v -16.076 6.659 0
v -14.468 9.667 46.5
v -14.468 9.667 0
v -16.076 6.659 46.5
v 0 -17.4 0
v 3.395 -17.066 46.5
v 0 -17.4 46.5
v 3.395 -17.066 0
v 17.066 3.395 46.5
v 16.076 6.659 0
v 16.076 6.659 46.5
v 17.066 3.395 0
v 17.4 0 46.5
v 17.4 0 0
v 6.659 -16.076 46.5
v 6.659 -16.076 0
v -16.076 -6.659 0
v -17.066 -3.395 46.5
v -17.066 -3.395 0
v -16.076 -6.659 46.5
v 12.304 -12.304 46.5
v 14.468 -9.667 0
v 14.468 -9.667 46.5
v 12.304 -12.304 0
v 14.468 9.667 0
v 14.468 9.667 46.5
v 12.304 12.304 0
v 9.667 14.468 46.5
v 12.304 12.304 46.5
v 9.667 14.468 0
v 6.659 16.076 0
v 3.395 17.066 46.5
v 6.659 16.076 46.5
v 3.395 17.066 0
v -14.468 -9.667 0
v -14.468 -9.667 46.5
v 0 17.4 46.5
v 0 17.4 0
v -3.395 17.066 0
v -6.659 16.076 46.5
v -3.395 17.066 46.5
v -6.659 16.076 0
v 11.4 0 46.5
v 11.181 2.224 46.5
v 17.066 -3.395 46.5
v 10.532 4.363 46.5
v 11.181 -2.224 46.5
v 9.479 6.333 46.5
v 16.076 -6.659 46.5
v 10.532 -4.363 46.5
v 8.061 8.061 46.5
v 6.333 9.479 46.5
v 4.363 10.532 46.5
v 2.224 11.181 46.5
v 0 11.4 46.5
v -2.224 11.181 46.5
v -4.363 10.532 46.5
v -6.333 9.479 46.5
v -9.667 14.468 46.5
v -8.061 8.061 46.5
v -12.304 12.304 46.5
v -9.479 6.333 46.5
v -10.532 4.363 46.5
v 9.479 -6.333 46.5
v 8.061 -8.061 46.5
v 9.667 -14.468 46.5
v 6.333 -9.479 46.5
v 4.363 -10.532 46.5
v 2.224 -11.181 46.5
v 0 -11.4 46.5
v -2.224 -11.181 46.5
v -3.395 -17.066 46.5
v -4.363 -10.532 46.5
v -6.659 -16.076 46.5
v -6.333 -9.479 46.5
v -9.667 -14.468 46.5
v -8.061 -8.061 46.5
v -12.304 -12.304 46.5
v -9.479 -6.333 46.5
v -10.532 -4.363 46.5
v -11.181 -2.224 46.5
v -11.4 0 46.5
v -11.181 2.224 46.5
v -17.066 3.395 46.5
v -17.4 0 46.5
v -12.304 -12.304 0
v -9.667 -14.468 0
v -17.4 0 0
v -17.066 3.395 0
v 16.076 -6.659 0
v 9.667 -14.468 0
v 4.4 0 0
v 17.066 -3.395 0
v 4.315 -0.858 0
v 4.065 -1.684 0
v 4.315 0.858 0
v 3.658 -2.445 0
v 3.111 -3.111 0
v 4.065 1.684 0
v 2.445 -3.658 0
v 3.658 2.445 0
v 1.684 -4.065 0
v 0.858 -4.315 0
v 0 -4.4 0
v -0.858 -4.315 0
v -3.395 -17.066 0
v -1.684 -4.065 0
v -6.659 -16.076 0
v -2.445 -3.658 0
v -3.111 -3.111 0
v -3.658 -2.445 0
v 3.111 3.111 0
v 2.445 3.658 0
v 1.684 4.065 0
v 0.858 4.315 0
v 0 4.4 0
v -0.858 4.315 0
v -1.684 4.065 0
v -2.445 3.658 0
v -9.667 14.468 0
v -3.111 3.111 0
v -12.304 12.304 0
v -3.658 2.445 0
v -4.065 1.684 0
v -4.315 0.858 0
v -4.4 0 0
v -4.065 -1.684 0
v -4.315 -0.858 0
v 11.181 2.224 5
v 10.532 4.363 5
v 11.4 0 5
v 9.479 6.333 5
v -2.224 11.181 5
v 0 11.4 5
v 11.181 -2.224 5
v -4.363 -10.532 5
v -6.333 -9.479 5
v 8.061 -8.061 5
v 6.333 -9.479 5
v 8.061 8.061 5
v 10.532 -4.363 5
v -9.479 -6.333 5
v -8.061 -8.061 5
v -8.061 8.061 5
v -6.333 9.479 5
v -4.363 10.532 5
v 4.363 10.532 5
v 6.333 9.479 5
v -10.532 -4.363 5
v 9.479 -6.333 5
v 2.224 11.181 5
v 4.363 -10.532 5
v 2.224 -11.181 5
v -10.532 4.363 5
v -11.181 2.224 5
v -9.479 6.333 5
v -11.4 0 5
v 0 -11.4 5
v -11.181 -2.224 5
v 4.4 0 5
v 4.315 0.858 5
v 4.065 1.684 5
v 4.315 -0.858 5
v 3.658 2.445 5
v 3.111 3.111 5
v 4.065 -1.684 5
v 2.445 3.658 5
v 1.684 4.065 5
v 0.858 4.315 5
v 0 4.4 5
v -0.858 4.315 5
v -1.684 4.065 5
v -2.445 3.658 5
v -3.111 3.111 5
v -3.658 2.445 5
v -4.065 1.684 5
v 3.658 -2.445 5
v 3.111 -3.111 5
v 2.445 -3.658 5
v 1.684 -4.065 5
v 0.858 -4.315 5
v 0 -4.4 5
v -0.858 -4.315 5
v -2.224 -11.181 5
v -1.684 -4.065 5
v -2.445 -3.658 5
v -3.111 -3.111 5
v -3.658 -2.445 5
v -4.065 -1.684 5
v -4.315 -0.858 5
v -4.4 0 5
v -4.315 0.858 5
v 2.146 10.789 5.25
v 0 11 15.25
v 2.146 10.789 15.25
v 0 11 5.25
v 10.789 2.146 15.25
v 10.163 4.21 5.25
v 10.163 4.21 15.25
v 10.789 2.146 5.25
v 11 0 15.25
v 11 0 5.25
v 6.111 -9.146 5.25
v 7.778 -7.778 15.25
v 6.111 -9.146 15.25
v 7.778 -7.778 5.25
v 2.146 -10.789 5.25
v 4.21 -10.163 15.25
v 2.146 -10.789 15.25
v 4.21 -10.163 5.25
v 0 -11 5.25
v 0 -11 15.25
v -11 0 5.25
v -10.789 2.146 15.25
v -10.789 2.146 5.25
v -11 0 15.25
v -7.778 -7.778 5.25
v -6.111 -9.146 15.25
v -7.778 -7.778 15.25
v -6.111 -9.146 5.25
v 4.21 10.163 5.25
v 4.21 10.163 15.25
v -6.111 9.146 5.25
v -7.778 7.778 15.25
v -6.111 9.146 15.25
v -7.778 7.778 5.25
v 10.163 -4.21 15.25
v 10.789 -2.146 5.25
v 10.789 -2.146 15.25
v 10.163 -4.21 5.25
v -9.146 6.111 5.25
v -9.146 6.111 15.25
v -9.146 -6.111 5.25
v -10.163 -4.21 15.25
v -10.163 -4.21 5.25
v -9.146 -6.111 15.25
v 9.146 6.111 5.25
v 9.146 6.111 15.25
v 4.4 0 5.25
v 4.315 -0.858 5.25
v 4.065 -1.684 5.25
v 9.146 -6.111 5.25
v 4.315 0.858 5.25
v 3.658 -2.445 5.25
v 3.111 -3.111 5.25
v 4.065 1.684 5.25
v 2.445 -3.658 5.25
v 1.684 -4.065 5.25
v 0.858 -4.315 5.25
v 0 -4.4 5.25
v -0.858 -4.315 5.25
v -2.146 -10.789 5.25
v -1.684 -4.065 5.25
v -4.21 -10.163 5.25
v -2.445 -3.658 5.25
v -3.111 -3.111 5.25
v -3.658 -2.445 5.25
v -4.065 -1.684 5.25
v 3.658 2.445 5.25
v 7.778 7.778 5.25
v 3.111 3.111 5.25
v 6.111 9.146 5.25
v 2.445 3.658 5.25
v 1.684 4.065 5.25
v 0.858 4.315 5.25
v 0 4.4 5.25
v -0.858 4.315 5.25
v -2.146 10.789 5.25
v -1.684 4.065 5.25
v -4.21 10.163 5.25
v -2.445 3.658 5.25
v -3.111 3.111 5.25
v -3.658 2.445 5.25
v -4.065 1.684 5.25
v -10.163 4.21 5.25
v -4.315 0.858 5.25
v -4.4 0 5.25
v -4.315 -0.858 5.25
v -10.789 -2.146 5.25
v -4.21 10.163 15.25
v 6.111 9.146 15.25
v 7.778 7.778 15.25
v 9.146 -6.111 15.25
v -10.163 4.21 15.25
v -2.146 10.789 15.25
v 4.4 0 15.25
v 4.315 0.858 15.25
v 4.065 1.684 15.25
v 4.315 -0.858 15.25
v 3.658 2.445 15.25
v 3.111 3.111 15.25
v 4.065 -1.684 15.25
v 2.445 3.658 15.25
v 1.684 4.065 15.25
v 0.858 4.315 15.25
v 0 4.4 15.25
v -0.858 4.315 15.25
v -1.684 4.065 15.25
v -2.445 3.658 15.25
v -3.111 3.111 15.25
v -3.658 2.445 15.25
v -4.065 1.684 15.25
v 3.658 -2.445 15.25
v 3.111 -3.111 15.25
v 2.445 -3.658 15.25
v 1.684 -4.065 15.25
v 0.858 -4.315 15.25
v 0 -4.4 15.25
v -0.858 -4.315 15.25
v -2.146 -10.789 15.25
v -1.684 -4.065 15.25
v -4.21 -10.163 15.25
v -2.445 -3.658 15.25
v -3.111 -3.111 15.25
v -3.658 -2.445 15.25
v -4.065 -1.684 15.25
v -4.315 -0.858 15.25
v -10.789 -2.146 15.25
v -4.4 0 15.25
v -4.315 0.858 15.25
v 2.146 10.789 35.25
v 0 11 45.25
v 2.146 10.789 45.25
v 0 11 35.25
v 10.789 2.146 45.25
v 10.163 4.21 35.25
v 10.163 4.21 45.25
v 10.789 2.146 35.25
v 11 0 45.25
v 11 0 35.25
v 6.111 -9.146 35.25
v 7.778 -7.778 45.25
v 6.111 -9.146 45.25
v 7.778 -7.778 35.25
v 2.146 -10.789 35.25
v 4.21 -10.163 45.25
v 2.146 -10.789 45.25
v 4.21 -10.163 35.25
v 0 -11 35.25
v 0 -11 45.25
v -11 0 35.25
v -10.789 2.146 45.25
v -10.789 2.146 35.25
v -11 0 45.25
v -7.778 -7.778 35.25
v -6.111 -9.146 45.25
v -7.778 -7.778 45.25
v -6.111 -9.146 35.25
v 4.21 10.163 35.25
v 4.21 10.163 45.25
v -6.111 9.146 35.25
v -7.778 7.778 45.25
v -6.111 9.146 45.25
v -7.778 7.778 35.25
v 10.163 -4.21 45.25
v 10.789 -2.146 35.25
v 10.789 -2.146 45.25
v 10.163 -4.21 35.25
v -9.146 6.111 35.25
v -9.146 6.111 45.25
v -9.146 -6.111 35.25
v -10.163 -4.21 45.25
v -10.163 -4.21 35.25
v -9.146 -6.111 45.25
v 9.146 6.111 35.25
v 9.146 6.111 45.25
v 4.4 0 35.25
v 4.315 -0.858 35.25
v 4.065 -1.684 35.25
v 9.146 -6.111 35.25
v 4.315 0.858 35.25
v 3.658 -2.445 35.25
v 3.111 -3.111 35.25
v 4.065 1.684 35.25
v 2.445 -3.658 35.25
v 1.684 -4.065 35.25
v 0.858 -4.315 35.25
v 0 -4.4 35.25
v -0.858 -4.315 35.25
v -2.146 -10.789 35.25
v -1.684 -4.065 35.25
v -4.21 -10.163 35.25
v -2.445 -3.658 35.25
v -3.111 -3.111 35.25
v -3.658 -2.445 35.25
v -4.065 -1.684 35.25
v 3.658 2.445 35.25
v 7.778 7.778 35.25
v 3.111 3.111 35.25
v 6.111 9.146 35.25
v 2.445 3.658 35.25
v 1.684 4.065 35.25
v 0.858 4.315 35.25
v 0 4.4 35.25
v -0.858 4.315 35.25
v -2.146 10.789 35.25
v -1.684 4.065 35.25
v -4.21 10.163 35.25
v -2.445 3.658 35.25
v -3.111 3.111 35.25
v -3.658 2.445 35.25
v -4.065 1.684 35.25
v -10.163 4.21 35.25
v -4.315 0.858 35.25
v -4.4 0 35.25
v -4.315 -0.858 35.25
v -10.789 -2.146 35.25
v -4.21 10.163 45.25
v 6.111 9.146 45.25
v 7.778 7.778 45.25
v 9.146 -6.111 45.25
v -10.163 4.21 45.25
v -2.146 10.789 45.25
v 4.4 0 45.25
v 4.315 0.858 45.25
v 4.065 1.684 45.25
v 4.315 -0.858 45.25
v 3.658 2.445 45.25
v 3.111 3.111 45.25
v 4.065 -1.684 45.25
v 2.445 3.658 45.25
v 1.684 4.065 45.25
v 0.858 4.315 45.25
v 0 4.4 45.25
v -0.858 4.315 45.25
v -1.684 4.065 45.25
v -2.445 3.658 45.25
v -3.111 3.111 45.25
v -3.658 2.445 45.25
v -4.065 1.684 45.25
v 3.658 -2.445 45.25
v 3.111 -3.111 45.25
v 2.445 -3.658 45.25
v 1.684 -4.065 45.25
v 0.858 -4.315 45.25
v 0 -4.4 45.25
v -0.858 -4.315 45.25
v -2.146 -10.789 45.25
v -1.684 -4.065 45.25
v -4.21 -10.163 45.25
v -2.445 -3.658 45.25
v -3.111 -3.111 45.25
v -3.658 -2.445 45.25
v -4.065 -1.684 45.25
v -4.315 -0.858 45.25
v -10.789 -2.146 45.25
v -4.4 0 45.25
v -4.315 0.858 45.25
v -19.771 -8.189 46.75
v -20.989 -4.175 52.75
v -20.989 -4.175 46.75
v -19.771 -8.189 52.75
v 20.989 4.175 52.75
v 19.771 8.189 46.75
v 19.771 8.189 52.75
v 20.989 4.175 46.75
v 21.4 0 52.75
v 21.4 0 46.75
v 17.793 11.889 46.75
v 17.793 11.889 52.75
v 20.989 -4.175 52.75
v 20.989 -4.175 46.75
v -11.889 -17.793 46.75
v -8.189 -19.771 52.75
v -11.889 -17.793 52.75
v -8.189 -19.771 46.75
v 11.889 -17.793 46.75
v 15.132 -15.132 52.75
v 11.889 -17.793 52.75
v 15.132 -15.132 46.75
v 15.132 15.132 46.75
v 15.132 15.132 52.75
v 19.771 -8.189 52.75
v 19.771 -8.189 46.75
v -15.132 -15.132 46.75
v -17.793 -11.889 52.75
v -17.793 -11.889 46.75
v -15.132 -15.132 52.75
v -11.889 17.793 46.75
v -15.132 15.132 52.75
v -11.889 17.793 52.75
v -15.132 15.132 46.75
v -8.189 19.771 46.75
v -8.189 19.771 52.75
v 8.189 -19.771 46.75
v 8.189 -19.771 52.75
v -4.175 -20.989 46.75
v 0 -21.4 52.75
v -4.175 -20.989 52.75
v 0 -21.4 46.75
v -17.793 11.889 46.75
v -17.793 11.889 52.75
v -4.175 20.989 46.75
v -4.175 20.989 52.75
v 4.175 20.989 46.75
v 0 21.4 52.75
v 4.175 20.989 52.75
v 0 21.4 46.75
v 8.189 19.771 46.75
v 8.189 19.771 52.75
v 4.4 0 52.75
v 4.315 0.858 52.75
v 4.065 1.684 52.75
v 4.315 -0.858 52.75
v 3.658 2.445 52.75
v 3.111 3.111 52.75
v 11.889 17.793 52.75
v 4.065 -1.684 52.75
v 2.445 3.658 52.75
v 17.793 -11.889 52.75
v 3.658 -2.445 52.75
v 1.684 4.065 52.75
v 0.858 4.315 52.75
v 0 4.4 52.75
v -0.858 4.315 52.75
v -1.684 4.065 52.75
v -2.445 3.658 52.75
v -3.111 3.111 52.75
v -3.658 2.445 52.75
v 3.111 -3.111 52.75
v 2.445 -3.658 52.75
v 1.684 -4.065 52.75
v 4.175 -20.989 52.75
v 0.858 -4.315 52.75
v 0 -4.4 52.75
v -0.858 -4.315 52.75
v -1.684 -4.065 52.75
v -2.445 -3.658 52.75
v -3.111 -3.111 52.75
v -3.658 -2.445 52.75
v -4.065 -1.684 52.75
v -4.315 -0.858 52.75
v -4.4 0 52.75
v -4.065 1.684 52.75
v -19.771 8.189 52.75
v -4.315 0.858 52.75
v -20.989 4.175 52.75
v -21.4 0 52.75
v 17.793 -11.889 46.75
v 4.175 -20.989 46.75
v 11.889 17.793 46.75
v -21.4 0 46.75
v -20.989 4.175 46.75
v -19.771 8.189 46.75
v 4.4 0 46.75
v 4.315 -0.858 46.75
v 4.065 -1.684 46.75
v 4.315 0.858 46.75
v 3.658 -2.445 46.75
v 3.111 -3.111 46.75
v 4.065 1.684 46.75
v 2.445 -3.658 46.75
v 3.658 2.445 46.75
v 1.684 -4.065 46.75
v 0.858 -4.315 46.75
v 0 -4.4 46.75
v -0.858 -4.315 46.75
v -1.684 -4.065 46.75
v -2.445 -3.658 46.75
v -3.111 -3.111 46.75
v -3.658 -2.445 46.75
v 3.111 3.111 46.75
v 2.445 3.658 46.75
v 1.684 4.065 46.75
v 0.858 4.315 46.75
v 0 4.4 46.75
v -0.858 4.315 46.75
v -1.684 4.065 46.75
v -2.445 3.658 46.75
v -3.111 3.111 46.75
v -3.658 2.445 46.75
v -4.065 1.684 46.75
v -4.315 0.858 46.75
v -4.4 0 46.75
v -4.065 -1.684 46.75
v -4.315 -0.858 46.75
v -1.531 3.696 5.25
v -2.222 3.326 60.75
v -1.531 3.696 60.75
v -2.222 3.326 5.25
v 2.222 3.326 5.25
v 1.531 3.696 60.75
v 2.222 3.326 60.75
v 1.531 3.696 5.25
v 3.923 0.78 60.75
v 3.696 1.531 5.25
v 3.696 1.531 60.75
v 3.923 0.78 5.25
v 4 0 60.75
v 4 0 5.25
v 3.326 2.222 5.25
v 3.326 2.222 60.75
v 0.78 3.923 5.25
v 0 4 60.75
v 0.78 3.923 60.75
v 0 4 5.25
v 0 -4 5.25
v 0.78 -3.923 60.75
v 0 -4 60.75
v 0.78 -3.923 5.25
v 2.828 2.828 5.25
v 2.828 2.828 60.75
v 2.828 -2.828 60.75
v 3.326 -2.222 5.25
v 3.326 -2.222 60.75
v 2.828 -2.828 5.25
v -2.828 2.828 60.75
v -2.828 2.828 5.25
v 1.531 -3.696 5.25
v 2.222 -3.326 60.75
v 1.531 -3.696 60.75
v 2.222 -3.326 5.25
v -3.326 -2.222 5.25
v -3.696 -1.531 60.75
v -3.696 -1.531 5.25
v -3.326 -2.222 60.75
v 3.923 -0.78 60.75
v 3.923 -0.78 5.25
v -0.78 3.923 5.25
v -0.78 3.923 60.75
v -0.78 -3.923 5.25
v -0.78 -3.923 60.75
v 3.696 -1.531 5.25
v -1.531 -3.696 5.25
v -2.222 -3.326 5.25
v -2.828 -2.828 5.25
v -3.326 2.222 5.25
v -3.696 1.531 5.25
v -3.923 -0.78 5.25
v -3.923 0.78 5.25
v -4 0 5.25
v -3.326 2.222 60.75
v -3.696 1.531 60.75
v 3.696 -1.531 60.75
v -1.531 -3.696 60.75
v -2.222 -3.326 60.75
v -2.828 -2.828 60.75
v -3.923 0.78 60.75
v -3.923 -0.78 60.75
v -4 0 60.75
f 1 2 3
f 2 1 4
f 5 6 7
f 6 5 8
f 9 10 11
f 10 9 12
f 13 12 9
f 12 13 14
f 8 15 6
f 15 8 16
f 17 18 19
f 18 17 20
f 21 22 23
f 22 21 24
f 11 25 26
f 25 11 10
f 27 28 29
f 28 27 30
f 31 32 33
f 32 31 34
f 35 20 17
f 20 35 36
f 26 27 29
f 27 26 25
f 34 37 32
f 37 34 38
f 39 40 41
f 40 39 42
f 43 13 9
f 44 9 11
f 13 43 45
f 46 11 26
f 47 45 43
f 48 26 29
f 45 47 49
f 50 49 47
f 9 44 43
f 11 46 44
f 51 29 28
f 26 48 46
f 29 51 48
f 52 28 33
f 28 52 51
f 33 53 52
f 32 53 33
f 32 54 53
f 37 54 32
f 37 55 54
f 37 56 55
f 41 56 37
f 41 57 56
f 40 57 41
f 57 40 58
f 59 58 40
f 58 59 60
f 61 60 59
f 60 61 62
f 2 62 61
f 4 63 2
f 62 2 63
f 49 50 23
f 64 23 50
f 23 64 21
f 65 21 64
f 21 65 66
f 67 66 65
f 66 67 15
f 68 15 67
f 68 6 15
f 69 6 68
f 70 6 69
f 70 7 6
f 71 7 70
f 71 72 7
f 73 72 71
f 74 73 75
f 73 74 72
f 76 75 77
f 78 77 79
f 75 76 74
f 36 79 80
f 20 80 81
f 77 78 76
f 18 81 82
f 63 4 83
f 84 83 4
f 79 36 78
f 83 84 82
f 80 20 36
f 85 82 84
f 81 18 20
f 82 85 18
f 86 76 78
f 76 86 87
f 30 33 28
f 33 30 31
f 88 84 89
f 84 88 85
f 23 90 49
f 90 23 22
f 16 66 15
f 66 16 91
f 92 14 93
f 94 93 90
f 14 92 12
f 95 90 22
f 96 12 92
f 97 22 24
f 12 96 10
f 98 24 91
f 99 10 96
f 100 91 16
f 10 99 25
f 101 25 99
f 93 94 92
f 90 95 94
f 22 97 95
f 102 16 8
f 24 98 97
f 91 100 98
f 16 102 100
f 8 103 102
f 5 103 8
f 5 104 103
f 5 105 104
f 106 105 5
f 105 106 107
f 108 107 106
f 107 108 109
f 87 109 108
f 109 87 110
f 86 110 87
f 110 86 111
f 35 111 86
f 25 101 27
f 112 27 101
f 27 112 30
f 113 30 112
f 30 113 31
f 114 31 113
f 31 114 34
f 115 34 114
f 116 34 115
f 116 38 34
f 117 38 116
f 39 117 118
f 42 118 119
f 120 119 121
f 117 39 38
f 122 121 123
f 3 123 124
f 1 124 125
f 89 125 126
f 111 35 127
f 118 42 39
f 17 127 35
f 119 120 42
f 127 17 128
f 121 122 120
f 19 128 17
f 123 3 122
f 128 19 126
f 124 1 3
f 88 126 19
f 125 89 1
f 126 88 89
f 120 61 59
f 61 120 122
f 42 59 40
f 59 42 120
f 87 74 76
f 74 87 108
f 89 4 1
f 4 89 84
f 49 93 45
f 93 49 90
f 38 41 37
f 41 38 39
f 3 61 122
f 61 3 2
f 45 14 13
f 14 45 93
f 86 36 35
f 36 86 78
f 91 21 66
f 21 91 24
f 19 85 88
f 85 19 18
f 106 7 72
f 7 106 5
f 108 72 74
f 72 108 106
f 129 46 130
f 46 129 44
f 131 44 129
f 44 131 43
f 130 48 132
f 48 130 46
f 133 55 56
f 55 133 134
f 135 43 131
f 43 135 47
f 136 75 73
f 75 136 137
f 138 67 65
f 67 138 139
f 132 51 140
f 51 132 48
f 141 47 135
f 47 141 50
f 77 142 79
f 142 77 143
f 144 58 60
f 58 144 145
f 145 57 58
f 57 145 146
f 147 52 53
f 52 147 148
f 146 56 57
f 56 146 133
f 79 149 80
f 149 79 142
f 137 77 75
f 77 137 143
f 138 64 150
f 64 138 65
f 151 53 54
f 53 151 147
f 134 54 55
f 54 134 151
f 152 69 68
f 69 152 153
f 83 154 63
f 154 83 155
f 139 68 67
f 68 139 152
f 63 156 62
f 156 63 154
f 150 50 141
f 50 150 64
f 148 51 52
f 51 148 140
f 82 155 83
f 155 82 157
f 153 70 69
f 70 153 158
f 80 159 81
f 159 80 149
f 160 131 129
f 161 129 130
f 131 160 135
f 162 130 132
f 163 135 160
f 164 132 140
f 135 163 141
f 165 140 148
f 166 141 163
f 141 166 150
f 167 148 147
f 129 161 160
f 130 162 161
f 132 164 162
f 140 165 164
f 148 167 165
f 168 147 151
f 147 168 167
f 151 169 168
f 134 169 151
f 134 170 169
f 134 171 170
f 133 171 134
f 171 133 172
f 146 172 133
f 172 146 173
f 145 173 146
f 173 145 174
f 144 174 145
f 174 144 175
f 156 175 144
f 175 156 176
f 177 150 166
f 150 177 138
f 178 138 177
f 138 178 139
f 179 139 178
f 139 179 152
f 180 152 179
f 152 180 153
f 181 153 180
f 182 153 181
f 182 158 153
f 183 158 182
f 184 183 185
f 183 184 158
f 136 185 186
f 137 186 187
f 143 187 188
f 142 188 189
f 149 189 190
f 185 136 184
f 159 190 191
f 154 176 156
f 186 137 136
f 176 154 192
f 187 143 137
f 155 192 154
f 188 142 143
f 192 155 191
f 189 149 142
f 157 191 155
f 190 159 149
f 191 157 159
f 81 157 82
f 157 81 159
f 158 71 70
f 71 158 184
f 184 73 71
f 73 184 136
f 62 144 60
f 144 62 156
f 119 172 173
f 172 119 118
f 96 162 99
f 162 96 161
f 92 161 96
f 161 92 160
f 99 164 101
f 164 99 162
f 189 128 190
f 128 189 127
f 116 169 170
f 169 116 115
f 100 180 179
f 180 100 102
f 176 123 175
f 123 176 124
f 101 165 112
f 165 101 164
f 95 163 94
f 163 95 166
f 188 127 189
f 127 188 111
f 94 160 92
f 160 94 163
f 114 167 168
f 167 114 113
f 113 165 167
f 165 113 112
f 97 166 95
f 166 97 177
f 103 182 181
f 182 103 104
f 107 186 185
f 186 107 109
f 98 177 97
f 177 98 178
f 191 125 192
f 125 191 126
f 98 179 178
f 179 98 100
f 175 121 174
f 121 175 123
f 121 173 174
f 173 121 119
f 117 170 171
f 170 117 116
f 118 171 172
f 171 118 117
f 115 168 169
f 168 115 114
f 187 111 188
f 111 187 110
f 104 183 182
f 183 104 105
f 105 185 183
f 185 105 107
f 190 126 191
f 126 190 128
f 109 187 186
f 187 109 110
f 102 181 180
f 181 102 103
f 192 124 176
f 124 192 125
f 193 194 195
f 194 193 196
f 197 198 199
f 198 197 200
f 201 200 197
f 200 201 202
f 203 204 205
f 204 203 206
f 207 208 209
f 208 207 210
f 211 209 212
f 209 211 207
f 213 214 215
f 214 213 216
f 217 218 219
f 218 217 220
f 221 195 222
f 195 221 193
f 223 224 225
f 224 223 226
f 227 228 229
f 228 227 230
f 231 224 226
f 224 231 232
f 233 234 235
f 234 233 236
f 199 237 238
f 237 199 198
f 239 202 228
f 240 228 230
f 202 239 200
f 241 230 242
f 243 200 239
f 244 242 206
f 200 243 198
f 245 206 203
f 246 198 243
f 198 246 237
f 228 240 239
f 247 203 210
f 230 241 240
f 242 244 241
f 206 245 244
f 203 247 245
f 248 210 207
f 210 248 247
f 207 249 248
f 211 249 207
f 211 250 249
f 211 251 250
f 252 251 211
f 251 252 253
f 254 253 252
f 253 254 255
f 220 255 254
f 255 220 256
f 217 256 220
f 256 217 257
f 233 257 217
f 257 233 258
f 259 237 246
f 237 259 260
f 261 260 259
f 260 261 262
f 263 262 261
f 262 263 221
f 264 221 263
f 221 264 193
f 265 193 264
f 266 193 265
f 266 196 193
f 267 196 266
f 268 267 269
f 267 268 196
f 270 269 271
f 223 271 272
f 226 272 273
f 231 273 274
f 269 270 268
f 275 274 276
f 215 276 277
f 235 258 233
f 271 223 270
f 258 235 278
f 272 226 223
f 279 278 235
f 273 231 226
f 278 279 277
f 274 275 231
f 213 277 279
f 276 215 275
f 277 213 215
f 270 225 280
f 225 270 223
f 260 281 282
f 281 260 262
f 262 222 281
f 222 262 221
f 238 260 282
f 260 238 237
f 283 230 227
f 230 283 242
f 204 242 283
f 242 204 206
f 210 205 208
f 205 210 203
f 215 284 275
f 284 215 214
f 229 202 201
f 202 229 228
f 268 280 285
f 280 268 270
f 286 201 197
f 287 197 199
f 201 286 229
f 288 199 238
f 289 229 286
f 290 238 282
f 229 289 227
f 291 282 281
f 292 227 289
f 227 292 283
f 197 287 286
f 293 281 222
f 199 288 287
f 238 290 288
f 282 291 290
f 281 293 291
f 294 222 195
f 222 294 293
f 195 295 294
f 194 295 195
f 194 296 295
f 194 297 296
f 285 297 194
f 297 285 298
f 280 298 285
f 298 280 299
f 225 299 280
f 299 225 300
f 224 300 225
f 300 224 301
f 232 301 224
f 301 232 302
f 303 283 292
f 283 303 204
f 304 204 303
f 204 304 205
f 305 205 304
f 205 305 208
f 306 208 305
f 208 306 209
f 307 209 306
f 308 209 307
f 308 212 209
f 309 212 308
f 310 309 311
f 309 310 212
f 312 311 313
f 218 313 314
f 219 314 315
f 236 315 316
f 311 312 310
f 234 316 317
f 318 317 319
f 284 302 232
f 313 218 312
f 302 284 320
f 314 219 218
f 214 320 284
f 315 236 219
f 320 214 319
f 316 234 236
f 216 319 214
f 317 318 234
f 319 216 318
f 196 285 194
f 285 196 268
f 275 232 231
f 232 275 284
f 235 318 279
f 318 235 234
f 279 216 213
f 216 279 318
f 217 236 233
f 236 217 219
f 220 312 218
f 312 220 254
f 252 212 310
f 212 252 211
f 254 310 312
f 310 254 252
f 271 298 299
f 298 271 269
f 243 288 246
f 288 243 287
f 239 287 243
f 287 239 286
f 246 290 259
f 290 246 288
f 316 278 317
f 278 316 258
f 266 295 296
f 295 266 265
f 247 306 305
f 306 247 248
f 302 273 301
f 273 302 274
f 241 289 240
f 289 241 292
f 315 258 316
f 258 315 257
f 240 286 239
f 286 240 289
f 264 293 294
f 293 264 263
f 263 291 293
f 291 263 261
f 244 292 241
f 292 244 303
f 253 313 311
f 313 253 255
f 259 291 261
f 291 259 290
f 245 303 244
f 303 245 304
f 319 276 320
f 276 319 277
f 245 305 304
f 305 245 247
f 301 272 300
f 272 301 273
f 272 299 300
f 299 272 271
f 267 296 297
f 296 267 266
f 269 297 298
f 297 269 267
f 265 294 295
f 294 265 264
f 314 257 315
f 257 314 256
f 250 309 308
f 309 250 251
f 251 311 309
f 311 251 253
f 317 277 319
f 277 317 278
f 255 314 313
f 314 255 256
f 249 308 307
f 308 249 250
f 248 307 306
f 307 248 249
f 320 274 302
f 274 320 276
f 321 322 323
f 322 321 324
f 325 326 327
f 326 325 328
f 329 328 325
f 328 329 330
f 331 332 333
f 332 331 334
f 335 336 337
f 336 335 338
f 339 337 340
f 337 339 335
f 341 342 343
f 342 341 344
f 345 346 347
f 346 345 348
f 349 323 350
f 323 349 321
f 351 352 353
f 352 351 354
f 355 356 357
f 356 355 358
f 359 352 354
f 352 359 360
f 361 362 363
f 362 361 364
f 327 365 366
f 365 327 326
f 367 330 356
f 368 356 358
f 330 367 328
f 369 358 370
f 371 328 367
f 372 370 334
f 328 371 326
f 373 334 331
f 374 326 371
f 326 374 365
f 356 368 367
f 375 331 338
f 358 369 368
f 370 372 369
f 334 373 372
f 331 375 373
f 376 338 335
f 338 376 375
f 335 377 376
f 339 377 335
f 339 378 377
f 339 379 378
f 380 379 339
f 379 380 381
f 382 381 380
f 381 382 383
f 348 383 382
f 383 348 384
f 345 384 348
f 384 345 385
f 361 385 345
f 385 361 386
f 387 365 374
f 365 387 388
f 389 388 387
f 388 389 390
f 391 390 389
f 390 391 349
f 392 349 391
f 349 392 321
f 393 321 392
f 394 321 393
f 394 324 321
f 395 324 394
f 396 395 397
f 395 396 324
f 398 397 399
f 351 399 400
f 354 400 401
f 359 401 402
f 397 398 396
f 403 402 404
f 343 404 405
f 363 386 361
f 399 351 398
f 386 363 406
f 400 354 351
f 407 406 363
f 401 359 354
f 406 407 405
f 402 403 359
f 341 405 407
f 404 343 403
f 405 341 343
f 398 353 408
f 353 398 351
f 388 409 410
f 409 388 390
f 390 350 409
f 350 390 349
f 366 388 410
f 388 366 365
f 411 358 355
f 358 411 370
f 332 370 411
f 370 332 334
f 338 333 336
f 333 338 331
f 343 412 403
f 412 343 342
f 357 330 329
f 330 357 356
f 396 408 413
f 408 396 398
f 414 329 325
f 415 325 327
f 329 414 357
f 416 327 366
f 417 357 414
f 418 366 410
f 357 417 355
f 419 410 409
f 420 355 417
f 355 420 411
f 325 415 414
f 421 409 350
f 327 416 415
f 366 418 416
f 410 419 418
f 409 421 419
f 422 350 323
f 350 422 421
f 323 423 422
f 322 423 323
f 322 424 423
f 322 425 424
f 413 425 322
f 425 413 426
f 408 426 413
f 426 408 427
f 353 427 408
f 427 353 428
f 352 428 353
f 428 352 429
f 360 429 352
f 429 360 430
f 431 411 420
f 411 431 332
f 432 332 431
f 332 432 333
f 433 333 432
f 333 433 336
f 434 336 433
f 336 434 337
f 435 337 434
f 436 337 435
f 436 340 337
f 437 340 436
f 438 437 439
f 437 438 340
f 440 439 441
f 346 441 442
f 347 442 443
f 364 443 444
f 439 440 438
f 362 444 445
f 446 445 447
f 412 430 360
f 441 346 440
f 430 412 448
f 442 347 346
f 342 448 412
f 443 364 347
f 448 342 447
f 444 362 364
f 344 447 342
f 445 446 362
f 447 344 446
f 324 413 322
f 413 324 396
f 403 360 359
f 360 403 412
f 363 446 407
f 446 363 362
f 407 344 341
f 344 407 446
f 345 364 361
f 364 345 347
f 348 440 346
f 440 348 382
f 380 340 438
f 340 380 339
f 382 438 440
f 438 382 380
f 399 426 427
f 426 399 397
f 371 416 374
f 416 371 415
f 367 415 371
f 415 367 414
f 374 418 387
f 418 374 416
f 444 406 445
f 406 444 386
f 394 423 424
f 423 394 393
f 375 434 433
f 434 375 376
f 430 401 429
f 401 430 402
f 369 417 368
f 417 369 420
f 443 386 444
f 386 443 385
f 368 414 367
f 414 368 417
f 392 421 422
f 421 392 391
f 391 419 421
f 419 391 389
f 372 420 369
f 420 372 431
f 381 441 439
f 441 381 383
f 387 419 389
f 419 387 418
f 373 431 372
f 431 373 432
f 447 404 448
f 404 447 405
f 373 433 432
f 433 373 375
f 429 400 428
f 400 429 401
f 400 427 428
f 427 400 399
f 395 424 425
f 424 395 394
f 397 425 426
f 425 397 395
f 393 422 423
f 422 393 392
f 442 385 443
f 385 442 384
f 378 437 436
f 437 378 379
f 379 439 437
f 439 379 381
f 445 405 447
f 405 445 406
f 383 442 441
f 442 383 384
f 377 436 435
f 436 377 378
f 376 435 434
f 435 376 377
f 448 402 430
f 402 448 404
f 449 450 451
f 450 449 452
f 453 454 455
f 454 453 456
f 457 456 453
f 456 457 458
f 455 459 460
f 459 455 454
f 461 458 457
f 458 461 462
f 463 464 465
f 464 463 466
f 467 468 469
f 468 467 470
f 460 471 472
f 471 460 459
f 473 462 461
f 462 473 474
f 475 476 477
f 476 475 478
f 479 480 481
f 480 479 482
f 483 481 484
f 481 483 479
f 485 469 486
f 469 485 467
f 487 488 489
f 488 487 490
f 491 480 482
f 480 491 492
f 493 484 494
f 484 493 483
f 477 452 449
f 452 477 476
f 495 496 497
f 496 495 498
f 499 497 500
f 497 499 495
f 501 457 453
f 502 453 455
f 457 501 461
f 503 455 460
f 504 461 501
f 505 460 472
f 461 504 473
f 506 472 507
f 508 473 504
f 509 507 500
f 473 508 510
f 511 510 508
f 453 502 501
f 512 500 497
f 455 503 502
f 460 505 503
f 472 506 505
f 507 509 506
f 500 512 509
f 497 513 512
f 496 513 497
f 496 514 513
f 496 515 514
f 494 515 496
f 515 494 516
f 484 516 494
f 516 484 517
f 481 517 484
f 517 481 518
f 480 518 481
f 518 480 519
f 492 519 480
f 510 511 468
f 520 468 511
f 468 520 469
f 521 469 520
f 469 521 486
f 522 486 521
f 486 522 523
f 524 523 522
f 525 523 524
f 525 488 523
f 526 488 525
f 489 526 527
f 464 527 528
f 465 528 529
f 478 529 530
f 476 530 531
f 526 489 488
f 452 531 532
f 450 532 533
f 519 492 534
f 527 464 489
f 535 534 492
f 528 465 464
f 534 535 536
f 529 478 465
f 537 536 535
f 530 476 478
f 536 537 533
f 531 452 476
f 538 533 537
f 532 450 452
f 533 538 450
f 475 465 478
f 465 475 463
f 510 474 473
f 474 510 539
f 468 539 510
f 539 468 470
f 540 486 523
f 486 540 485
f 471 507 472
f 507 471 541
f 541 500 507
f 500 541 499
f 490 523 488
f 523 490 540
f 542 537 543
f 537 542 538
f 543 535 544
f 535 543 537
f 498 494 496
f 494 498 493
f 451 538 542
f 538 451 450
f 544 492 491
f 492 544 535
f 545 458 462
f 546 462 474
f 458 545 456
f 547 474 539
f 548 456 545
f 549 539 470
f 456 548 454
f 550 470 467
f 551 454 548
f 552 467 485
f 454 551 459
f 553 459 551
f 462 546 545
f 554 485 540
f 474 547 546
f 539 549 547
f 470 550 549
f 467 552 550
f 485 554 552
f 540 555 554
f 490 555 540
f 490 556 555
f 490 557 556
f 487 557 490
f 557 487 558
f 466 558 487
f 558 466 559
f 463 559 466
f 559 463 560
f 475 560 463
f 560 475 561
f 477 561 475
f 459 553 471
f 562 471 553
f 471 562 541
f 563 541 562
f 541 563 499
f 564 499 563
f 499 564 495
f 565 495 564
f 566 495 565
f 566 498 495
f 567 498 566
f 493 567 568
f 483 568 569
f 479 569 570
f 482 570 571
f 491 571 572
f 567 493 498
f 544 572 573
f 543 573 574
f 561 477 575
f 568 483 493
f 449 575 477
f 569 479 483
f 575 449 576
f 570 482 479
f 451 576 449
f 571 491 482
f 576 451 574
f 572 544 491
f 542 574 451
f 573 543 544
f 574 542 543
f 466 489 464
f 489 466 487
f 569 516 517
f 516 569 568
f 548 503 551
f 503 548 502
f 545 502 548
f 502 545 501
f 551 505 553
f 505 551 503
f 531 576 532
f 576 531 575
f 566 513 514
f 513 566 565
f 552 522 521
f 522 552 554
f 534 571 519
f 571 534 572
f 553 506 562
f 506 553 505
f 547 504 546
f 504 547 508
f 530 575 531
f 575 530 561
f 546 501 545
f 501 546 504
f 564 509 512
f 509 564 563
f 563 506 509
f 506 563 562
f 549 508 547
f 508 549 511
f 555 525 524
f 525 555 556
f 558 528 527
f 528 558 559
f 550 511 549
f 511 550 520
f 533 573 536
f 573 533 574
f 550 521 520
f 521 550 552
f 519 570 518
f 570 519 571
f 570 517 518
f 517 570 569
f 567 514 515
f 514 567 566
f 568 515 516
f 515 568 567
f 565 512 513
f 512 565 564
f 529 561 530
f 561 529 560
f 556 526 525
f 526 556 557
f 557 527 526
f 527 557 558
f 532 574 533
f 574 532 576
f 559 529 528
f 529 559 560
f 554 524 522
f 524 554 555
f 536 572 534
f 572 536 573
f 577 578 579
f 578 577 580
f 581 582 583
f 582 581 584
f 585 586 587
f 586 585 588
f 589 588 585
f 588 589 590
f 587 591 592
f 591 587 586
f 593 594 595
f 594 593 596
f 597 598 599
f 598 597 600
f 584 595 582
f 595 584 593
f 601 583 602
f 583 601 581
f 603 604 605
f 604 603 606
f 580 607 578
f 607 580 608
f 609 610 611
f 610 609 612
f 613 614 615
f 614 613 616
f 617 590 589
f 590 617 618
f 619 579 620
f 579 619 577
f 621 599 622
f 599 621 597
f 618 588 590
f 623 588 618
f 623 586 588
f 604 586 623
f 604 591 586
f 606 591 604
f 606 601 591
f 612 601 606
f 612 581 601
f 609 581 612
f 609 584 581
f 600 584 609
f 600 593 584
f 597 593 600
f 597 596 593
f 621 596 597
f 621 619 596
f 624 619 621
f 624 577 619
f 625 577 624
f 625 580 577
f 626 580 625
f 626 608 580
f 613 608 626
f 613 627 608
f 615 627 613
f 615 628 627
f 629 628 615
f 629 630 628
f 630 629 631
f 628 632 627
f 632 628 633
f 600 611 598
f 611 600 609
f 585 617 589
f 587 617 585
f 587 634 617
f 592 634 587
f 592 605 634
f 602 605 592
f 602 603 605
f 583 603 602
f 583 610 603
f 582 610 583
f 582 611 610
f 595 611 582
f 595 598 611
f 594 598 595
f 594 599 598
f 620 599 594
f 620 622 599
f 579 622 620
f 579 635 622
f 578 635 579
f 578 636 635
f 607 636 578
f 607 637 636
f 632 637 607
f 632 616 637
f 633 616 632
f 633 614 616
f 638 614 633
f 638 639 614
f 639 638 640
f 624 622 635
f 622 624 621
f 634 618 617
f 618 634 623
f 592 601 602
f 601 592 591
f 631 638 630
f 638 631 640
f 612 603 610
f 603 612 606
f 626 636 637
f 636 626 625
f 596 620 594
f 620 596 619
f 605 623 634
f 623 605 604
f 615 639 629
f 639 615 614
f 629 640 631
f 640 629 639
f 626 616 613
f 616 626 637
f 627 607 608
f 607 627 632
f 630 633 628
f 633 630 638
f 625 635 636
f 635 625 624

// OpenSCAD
$fn = 32;

// ------------------------------------------------------------------------
// Shaft station: cup d34.8 x 46.5 mm, shaft d8
// Every part is its own module, assembly() places every instance.
// ------------------------------------------------------------------------

// --- part 1 ---
module housing_cup() {
  difference() {
    cylinder(h = 46.5, d = 34.8);
    translate([0, 0, 5]) cylinder(h = 42.5, d = 22.8);
    translate([0, 0, -1]) cylinder(h = 7, d = 8.8);
  }
}

// --- part 2 ---
module bearing_lower() {
  difference() {
      translate([0, 0, 0]) cylinder(h = 10, d = 22);
      translate([0, 0, -1]) cylinder(h = 12, d = 8.8);
    }
}

// --- part 3 ---
module bearing_upper() {
  difference() {
      translate([0, 0, 0]) cylinder(h = 10, d = 22);
      translate([0, 0, -1]) cylinder(h = 12, d = 8.8);
    }
}

// --- part 4 ---
module station_shaft() {
  translate([0, 0, -27.75]) cylinder(h = 55.5, d = 8);
}

// --- part 5 ---
module station_cover() {
  difference() {
    cylinder(h = 6, d = 42.8);
    translate([0, 0, -1]) cylinder(h = 8, d = 8.8);
  }
}

// --- assembly ---
module assembly() {
  color([0.80, 0.24, 0.20]) translate([0, 0, 0]) rotate([0, 0, 0]) housing_cup();
  color([0.20, 0.45, 0.75]) translate([0, 0, 5.25]) rotate([0, 0, 0]) bearing_lower();
  color([0.25, 0.62, 0.32]) translate([0, 0, 35.25]) rotate([0, 0, 0]) bearing_upper();
  color([0.92, 0.70, 0.18]) translate([0, 0, 33]) rotate([0, 0, 0]) station_shaft();
  color([0.58, 0.35, 0.70]) translate([0, 0, 46.75]) rotate([0, 0, 0]) station_cover();
}

assembly();
